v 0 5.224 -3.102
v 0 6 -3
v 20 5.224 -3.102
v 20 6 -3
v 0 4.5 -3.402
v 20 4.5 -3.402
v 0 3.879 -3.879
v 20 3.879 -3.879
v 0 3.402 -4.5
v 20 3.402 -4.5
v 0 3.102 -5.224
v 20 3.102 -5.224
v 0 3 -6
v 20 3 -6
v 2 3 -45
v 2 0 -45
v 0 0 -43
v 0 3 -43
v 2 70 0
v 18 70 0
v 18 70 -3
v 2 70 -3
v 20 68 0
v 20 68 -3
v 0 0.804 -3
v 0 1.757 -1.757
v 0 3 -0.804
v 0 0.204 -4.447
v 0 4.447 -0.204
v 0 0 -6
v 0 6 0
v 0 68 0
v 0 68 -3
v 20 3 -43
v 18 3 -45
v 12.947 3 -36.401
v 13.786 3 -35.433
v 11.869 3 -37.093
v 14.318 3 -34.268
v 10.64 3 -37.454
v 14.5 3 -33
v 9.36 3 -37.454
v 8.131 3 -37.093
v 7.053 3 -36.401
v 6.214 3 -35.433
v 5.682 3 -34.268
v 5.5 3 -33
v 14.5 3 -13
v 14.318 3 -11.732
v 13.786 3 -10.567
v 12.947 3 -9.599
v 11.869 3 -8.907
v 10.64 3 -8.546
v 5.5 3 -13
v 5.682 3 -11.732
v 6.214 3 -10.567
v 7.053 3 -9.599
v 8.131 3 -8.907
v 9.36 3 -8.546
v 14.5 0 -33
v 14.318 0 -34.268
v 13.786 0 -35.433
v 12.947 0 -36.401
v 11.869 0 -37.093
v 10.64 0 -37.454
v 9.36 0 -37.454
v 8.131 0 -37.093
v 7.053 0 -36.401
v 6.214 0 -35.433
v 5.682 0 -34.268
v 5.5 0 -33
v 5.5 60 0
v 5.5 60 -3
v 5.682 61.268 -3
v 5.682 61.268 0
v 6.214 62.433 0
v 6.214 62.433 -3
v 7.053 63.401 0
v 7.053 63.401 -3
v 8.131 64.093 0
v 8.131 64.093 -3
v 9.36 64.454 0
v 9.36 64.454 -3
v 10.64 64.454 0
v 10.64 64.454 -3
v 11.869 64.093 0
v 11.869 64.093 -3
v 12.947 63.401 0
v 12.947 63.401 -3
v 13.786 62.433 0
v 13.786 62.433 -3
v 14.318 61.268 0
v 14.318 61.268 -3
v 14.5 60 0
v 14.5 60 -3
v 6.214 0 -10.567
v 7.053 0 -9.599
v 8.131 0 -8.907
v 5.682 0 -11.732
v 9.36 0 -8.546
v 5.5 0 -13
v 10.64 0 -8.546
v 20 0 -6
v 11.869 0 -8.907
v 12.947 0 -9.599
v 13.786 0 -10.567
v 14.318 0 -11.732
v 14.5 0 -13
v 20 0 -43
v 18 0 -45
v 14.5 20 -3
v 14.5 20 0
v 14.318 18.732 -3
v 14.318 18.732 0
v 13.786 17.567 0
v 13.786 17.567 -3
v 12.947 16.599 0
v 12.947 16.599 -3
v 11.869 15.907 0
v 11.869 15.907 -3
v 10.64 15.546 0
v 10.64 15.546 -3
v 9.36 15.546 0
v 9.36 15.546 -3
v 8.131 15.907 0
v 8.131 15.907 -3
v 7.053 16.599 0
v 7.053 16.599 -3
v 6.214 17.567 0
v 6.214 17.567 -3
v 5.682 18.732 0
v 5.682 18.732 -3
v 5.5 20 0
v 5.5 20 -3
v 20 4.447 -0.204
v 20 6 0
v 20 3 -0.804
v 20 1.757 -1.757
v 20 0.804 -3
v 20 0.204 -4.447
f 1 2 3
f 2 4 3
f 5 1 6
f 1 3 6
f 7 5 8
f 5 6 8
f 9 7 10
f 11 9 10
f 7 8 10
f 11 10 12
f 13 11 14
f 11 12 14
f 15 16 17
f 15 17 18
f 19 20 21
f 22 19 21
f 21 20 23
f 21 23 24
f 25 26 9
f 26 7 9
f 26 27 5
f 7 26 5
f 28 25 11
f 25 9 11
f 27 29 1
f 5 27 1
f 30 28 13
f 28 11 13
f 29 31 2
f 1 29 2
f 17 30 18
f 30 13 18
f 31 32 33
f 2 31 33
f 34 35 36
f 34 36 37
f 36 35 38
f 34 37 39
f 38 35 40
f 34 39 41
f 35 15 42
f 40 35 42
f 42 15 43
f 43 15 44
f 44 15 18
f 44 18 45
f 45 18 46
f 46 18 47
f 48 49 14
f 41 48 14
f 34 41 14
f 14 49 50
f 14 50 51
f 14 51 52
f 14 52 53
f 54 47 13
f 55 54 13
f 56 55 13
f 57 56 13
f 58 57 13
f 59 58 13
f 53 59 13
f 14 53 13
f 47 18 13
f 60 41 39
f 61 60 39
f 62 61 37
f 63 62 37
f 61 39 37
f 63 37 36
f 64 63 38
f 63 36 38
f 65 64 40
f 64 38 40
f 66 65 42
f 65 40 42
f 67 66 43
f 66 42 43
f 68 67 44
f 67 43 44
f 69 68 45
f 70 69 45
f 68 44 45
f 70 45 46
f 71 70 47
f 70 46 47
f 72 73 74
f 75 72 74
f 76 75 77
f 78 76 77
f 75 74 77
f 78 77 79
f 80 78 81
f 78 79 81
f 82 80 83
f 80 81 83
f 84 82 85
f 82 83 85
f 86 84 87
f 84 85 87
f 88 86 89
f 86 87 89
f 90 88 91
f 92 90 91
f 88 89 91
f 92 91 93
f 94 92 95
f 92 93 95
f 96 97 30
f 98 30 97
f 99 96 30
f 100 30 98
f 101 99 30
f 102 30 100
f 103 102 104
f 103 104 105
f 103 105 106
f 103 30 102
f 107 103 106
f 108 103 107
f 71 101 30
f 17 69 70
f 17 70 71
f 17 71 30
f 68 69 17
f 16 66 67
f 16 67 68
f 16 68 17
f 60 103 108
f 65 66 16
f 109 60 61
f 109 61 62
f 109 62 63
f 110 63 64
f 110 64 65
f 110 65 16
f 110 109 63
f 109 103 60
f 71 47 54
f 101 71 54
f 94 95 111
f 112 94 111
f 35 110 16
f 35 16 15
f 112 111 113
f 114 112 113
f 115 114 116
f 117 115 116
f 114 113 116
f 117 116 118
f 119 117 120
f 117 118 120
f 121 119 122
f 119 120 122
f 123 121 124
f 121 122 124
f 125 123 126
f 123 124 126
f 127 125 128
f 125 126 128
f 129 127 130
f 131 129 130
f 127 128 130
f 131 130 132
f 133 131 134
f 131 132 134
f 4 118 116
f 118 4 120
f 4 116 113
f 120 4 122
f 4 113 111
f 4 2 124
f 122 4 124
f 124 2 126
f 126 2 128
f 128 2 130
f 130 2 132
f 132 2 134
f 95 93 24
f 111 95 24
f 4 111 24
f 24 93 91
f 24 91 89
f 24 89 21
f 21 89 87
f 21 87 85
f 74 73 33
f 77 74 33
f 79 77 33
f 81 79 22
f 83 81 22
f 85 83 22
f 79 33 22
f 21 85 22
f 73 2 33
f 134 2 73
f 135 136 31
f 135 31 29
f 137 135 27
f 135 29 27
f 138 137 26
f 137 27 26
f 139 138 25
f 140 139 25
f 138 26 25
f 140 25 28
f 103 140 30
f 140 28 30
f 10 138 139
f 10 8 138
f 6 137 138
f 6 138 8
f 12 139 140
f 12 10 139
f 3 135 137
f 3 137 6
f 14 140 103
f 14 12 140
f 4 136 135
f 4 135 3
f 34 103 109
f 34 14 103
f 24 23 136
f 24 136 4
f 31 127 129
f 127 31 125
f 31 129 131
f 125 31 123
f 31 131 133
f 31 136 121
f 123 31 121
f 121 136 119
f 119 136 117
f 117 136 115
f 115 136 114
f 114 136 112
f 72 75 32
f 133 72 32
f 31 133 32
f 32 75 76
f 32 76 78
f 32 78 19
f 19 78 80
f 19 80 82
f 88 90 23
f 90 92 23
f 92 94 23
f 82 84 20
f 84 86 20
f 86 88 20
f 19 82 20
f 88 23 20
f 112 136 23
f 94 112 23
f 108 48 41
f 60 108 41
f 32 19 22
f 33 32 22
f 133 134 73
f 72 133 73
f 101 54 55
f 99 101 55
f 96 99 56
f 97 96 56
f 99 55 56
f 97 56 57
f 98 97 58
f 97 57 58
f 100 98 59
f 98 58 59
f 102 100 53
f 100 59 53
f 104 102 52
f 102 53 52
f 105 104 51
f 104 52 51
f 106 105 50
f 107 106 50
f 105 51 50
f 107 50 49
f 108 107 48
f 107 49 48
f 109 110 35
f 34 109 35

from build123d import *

# Parameters (mm, degrees)
SKETCH1_W           = 45
SKETCH1_H           = 70
BOSS_EXTRUDE1_DEPTH = 20
SKETCH2_W           = 42
SKETCH2_H           = 67
CUT_EXTRUDE1_DEPTH  = 86.586213843
CUT_EXTRUDE2_DEPTH  = 84.150466024
CUT_EXTRUDE3_DEPTH  = 85.047605558
CHAMFER1_SIZE       = 2
FILLET1_R           = 3
FILLET2_R           = 6


with BuildPart() as part:
    # Sketch1 → Boss-Extrude1 (new body)
    with BuildSketch(Plane(origin=(20, 0, 0), x_dir=(0, 0, -1), z_dir=(1, 0, 0))):
        with Locations((22.5, 35)):
            Rectangle(SKETCH1_W, SKETCH1_H)
    extrude(amount=-BOSS_EXTRUDE1_DEPTH)

    # Sketch2 → Cut-Extrude1 (cut, through all)
    with BuildSketch(Plane.ZY):
        with Locations((-24, 36.5)):
            Rectangle(SKETCH2_W, SKETCH2_H)
    extrude(amount=-CUT_EXTRUDE1_DEPTH, mode=Mode.SUBTRACT)

    # Sketch3 → Cut-Extrude2 (cut, through all)
    with BuildSketch(Plane(origin=(0, 3, 0), x_dir=(-1, 0, 0), z_dir=(0, 1, 0))):
        with BuildLine():
            Line((-5.5, -33), (-5.5, -13))
            ThreePointArc((-5.5, -13), (-10, -8.5), (-14.5, -13))
            Line((-14.5, -13), (-14.5, -33))
            ThreePointArc((-14.5, -33), (-10, -37.5), (-5.5, -33))
        make_face()
    extrude(amount=-CUT_EXTRUDE2_DEPTH, mode=Mode.SUBTRACT)

    # Sketch4 → Cut-Extrude3 (cut, through all)
    with BuildSketch(Plane(origin=(0, 0, -3), x_dir=(-1, 0, 0), z_dir=(0, 0, -1))):
        with BuildLine():
            Line((-14.5, 60), (-14.5, 20))
            ThreePointArc((-14.5, 20), (-10, 15.5), (-5.5, 20))
            Line((-5.5, 20), (-5.5, 60))
            ThreePointArc((-5.5, 60), (-10, 64.5), (-14.5, 60))
        make_face()
    extrude(amount=-CUT_EXTRUDE3_DEPTH, mode=Mode.SUBTRACT)

    # Chamfer1
    chamfer1_edges = [part.edges().sort_by_distance(p)[0] for p in [
        (0, 1.5, -45),
        (20, 70, -1.5),
        (0, 70, -1.5),
        (20, 1.5, -45),
    ]]
    chamfer(chamfer1_edges, length=CHAMFER1_SIZE)

    # Fillet1
    fillet1_edges = [part.edges().sort_by_distance(p)[0] for p in [
        (10, 3, -3),
    ]]
    fillet(fillet1_edges, radius=FILLET1_R)

    # Fillet2
    fillet2_edges = [part.edges().sort_by_distance(p)[0] for p in [
        (10, 0, 0),
    ]]
    fillet(fillet2_edges, radius=FILLET2_R)


solid = part.part
